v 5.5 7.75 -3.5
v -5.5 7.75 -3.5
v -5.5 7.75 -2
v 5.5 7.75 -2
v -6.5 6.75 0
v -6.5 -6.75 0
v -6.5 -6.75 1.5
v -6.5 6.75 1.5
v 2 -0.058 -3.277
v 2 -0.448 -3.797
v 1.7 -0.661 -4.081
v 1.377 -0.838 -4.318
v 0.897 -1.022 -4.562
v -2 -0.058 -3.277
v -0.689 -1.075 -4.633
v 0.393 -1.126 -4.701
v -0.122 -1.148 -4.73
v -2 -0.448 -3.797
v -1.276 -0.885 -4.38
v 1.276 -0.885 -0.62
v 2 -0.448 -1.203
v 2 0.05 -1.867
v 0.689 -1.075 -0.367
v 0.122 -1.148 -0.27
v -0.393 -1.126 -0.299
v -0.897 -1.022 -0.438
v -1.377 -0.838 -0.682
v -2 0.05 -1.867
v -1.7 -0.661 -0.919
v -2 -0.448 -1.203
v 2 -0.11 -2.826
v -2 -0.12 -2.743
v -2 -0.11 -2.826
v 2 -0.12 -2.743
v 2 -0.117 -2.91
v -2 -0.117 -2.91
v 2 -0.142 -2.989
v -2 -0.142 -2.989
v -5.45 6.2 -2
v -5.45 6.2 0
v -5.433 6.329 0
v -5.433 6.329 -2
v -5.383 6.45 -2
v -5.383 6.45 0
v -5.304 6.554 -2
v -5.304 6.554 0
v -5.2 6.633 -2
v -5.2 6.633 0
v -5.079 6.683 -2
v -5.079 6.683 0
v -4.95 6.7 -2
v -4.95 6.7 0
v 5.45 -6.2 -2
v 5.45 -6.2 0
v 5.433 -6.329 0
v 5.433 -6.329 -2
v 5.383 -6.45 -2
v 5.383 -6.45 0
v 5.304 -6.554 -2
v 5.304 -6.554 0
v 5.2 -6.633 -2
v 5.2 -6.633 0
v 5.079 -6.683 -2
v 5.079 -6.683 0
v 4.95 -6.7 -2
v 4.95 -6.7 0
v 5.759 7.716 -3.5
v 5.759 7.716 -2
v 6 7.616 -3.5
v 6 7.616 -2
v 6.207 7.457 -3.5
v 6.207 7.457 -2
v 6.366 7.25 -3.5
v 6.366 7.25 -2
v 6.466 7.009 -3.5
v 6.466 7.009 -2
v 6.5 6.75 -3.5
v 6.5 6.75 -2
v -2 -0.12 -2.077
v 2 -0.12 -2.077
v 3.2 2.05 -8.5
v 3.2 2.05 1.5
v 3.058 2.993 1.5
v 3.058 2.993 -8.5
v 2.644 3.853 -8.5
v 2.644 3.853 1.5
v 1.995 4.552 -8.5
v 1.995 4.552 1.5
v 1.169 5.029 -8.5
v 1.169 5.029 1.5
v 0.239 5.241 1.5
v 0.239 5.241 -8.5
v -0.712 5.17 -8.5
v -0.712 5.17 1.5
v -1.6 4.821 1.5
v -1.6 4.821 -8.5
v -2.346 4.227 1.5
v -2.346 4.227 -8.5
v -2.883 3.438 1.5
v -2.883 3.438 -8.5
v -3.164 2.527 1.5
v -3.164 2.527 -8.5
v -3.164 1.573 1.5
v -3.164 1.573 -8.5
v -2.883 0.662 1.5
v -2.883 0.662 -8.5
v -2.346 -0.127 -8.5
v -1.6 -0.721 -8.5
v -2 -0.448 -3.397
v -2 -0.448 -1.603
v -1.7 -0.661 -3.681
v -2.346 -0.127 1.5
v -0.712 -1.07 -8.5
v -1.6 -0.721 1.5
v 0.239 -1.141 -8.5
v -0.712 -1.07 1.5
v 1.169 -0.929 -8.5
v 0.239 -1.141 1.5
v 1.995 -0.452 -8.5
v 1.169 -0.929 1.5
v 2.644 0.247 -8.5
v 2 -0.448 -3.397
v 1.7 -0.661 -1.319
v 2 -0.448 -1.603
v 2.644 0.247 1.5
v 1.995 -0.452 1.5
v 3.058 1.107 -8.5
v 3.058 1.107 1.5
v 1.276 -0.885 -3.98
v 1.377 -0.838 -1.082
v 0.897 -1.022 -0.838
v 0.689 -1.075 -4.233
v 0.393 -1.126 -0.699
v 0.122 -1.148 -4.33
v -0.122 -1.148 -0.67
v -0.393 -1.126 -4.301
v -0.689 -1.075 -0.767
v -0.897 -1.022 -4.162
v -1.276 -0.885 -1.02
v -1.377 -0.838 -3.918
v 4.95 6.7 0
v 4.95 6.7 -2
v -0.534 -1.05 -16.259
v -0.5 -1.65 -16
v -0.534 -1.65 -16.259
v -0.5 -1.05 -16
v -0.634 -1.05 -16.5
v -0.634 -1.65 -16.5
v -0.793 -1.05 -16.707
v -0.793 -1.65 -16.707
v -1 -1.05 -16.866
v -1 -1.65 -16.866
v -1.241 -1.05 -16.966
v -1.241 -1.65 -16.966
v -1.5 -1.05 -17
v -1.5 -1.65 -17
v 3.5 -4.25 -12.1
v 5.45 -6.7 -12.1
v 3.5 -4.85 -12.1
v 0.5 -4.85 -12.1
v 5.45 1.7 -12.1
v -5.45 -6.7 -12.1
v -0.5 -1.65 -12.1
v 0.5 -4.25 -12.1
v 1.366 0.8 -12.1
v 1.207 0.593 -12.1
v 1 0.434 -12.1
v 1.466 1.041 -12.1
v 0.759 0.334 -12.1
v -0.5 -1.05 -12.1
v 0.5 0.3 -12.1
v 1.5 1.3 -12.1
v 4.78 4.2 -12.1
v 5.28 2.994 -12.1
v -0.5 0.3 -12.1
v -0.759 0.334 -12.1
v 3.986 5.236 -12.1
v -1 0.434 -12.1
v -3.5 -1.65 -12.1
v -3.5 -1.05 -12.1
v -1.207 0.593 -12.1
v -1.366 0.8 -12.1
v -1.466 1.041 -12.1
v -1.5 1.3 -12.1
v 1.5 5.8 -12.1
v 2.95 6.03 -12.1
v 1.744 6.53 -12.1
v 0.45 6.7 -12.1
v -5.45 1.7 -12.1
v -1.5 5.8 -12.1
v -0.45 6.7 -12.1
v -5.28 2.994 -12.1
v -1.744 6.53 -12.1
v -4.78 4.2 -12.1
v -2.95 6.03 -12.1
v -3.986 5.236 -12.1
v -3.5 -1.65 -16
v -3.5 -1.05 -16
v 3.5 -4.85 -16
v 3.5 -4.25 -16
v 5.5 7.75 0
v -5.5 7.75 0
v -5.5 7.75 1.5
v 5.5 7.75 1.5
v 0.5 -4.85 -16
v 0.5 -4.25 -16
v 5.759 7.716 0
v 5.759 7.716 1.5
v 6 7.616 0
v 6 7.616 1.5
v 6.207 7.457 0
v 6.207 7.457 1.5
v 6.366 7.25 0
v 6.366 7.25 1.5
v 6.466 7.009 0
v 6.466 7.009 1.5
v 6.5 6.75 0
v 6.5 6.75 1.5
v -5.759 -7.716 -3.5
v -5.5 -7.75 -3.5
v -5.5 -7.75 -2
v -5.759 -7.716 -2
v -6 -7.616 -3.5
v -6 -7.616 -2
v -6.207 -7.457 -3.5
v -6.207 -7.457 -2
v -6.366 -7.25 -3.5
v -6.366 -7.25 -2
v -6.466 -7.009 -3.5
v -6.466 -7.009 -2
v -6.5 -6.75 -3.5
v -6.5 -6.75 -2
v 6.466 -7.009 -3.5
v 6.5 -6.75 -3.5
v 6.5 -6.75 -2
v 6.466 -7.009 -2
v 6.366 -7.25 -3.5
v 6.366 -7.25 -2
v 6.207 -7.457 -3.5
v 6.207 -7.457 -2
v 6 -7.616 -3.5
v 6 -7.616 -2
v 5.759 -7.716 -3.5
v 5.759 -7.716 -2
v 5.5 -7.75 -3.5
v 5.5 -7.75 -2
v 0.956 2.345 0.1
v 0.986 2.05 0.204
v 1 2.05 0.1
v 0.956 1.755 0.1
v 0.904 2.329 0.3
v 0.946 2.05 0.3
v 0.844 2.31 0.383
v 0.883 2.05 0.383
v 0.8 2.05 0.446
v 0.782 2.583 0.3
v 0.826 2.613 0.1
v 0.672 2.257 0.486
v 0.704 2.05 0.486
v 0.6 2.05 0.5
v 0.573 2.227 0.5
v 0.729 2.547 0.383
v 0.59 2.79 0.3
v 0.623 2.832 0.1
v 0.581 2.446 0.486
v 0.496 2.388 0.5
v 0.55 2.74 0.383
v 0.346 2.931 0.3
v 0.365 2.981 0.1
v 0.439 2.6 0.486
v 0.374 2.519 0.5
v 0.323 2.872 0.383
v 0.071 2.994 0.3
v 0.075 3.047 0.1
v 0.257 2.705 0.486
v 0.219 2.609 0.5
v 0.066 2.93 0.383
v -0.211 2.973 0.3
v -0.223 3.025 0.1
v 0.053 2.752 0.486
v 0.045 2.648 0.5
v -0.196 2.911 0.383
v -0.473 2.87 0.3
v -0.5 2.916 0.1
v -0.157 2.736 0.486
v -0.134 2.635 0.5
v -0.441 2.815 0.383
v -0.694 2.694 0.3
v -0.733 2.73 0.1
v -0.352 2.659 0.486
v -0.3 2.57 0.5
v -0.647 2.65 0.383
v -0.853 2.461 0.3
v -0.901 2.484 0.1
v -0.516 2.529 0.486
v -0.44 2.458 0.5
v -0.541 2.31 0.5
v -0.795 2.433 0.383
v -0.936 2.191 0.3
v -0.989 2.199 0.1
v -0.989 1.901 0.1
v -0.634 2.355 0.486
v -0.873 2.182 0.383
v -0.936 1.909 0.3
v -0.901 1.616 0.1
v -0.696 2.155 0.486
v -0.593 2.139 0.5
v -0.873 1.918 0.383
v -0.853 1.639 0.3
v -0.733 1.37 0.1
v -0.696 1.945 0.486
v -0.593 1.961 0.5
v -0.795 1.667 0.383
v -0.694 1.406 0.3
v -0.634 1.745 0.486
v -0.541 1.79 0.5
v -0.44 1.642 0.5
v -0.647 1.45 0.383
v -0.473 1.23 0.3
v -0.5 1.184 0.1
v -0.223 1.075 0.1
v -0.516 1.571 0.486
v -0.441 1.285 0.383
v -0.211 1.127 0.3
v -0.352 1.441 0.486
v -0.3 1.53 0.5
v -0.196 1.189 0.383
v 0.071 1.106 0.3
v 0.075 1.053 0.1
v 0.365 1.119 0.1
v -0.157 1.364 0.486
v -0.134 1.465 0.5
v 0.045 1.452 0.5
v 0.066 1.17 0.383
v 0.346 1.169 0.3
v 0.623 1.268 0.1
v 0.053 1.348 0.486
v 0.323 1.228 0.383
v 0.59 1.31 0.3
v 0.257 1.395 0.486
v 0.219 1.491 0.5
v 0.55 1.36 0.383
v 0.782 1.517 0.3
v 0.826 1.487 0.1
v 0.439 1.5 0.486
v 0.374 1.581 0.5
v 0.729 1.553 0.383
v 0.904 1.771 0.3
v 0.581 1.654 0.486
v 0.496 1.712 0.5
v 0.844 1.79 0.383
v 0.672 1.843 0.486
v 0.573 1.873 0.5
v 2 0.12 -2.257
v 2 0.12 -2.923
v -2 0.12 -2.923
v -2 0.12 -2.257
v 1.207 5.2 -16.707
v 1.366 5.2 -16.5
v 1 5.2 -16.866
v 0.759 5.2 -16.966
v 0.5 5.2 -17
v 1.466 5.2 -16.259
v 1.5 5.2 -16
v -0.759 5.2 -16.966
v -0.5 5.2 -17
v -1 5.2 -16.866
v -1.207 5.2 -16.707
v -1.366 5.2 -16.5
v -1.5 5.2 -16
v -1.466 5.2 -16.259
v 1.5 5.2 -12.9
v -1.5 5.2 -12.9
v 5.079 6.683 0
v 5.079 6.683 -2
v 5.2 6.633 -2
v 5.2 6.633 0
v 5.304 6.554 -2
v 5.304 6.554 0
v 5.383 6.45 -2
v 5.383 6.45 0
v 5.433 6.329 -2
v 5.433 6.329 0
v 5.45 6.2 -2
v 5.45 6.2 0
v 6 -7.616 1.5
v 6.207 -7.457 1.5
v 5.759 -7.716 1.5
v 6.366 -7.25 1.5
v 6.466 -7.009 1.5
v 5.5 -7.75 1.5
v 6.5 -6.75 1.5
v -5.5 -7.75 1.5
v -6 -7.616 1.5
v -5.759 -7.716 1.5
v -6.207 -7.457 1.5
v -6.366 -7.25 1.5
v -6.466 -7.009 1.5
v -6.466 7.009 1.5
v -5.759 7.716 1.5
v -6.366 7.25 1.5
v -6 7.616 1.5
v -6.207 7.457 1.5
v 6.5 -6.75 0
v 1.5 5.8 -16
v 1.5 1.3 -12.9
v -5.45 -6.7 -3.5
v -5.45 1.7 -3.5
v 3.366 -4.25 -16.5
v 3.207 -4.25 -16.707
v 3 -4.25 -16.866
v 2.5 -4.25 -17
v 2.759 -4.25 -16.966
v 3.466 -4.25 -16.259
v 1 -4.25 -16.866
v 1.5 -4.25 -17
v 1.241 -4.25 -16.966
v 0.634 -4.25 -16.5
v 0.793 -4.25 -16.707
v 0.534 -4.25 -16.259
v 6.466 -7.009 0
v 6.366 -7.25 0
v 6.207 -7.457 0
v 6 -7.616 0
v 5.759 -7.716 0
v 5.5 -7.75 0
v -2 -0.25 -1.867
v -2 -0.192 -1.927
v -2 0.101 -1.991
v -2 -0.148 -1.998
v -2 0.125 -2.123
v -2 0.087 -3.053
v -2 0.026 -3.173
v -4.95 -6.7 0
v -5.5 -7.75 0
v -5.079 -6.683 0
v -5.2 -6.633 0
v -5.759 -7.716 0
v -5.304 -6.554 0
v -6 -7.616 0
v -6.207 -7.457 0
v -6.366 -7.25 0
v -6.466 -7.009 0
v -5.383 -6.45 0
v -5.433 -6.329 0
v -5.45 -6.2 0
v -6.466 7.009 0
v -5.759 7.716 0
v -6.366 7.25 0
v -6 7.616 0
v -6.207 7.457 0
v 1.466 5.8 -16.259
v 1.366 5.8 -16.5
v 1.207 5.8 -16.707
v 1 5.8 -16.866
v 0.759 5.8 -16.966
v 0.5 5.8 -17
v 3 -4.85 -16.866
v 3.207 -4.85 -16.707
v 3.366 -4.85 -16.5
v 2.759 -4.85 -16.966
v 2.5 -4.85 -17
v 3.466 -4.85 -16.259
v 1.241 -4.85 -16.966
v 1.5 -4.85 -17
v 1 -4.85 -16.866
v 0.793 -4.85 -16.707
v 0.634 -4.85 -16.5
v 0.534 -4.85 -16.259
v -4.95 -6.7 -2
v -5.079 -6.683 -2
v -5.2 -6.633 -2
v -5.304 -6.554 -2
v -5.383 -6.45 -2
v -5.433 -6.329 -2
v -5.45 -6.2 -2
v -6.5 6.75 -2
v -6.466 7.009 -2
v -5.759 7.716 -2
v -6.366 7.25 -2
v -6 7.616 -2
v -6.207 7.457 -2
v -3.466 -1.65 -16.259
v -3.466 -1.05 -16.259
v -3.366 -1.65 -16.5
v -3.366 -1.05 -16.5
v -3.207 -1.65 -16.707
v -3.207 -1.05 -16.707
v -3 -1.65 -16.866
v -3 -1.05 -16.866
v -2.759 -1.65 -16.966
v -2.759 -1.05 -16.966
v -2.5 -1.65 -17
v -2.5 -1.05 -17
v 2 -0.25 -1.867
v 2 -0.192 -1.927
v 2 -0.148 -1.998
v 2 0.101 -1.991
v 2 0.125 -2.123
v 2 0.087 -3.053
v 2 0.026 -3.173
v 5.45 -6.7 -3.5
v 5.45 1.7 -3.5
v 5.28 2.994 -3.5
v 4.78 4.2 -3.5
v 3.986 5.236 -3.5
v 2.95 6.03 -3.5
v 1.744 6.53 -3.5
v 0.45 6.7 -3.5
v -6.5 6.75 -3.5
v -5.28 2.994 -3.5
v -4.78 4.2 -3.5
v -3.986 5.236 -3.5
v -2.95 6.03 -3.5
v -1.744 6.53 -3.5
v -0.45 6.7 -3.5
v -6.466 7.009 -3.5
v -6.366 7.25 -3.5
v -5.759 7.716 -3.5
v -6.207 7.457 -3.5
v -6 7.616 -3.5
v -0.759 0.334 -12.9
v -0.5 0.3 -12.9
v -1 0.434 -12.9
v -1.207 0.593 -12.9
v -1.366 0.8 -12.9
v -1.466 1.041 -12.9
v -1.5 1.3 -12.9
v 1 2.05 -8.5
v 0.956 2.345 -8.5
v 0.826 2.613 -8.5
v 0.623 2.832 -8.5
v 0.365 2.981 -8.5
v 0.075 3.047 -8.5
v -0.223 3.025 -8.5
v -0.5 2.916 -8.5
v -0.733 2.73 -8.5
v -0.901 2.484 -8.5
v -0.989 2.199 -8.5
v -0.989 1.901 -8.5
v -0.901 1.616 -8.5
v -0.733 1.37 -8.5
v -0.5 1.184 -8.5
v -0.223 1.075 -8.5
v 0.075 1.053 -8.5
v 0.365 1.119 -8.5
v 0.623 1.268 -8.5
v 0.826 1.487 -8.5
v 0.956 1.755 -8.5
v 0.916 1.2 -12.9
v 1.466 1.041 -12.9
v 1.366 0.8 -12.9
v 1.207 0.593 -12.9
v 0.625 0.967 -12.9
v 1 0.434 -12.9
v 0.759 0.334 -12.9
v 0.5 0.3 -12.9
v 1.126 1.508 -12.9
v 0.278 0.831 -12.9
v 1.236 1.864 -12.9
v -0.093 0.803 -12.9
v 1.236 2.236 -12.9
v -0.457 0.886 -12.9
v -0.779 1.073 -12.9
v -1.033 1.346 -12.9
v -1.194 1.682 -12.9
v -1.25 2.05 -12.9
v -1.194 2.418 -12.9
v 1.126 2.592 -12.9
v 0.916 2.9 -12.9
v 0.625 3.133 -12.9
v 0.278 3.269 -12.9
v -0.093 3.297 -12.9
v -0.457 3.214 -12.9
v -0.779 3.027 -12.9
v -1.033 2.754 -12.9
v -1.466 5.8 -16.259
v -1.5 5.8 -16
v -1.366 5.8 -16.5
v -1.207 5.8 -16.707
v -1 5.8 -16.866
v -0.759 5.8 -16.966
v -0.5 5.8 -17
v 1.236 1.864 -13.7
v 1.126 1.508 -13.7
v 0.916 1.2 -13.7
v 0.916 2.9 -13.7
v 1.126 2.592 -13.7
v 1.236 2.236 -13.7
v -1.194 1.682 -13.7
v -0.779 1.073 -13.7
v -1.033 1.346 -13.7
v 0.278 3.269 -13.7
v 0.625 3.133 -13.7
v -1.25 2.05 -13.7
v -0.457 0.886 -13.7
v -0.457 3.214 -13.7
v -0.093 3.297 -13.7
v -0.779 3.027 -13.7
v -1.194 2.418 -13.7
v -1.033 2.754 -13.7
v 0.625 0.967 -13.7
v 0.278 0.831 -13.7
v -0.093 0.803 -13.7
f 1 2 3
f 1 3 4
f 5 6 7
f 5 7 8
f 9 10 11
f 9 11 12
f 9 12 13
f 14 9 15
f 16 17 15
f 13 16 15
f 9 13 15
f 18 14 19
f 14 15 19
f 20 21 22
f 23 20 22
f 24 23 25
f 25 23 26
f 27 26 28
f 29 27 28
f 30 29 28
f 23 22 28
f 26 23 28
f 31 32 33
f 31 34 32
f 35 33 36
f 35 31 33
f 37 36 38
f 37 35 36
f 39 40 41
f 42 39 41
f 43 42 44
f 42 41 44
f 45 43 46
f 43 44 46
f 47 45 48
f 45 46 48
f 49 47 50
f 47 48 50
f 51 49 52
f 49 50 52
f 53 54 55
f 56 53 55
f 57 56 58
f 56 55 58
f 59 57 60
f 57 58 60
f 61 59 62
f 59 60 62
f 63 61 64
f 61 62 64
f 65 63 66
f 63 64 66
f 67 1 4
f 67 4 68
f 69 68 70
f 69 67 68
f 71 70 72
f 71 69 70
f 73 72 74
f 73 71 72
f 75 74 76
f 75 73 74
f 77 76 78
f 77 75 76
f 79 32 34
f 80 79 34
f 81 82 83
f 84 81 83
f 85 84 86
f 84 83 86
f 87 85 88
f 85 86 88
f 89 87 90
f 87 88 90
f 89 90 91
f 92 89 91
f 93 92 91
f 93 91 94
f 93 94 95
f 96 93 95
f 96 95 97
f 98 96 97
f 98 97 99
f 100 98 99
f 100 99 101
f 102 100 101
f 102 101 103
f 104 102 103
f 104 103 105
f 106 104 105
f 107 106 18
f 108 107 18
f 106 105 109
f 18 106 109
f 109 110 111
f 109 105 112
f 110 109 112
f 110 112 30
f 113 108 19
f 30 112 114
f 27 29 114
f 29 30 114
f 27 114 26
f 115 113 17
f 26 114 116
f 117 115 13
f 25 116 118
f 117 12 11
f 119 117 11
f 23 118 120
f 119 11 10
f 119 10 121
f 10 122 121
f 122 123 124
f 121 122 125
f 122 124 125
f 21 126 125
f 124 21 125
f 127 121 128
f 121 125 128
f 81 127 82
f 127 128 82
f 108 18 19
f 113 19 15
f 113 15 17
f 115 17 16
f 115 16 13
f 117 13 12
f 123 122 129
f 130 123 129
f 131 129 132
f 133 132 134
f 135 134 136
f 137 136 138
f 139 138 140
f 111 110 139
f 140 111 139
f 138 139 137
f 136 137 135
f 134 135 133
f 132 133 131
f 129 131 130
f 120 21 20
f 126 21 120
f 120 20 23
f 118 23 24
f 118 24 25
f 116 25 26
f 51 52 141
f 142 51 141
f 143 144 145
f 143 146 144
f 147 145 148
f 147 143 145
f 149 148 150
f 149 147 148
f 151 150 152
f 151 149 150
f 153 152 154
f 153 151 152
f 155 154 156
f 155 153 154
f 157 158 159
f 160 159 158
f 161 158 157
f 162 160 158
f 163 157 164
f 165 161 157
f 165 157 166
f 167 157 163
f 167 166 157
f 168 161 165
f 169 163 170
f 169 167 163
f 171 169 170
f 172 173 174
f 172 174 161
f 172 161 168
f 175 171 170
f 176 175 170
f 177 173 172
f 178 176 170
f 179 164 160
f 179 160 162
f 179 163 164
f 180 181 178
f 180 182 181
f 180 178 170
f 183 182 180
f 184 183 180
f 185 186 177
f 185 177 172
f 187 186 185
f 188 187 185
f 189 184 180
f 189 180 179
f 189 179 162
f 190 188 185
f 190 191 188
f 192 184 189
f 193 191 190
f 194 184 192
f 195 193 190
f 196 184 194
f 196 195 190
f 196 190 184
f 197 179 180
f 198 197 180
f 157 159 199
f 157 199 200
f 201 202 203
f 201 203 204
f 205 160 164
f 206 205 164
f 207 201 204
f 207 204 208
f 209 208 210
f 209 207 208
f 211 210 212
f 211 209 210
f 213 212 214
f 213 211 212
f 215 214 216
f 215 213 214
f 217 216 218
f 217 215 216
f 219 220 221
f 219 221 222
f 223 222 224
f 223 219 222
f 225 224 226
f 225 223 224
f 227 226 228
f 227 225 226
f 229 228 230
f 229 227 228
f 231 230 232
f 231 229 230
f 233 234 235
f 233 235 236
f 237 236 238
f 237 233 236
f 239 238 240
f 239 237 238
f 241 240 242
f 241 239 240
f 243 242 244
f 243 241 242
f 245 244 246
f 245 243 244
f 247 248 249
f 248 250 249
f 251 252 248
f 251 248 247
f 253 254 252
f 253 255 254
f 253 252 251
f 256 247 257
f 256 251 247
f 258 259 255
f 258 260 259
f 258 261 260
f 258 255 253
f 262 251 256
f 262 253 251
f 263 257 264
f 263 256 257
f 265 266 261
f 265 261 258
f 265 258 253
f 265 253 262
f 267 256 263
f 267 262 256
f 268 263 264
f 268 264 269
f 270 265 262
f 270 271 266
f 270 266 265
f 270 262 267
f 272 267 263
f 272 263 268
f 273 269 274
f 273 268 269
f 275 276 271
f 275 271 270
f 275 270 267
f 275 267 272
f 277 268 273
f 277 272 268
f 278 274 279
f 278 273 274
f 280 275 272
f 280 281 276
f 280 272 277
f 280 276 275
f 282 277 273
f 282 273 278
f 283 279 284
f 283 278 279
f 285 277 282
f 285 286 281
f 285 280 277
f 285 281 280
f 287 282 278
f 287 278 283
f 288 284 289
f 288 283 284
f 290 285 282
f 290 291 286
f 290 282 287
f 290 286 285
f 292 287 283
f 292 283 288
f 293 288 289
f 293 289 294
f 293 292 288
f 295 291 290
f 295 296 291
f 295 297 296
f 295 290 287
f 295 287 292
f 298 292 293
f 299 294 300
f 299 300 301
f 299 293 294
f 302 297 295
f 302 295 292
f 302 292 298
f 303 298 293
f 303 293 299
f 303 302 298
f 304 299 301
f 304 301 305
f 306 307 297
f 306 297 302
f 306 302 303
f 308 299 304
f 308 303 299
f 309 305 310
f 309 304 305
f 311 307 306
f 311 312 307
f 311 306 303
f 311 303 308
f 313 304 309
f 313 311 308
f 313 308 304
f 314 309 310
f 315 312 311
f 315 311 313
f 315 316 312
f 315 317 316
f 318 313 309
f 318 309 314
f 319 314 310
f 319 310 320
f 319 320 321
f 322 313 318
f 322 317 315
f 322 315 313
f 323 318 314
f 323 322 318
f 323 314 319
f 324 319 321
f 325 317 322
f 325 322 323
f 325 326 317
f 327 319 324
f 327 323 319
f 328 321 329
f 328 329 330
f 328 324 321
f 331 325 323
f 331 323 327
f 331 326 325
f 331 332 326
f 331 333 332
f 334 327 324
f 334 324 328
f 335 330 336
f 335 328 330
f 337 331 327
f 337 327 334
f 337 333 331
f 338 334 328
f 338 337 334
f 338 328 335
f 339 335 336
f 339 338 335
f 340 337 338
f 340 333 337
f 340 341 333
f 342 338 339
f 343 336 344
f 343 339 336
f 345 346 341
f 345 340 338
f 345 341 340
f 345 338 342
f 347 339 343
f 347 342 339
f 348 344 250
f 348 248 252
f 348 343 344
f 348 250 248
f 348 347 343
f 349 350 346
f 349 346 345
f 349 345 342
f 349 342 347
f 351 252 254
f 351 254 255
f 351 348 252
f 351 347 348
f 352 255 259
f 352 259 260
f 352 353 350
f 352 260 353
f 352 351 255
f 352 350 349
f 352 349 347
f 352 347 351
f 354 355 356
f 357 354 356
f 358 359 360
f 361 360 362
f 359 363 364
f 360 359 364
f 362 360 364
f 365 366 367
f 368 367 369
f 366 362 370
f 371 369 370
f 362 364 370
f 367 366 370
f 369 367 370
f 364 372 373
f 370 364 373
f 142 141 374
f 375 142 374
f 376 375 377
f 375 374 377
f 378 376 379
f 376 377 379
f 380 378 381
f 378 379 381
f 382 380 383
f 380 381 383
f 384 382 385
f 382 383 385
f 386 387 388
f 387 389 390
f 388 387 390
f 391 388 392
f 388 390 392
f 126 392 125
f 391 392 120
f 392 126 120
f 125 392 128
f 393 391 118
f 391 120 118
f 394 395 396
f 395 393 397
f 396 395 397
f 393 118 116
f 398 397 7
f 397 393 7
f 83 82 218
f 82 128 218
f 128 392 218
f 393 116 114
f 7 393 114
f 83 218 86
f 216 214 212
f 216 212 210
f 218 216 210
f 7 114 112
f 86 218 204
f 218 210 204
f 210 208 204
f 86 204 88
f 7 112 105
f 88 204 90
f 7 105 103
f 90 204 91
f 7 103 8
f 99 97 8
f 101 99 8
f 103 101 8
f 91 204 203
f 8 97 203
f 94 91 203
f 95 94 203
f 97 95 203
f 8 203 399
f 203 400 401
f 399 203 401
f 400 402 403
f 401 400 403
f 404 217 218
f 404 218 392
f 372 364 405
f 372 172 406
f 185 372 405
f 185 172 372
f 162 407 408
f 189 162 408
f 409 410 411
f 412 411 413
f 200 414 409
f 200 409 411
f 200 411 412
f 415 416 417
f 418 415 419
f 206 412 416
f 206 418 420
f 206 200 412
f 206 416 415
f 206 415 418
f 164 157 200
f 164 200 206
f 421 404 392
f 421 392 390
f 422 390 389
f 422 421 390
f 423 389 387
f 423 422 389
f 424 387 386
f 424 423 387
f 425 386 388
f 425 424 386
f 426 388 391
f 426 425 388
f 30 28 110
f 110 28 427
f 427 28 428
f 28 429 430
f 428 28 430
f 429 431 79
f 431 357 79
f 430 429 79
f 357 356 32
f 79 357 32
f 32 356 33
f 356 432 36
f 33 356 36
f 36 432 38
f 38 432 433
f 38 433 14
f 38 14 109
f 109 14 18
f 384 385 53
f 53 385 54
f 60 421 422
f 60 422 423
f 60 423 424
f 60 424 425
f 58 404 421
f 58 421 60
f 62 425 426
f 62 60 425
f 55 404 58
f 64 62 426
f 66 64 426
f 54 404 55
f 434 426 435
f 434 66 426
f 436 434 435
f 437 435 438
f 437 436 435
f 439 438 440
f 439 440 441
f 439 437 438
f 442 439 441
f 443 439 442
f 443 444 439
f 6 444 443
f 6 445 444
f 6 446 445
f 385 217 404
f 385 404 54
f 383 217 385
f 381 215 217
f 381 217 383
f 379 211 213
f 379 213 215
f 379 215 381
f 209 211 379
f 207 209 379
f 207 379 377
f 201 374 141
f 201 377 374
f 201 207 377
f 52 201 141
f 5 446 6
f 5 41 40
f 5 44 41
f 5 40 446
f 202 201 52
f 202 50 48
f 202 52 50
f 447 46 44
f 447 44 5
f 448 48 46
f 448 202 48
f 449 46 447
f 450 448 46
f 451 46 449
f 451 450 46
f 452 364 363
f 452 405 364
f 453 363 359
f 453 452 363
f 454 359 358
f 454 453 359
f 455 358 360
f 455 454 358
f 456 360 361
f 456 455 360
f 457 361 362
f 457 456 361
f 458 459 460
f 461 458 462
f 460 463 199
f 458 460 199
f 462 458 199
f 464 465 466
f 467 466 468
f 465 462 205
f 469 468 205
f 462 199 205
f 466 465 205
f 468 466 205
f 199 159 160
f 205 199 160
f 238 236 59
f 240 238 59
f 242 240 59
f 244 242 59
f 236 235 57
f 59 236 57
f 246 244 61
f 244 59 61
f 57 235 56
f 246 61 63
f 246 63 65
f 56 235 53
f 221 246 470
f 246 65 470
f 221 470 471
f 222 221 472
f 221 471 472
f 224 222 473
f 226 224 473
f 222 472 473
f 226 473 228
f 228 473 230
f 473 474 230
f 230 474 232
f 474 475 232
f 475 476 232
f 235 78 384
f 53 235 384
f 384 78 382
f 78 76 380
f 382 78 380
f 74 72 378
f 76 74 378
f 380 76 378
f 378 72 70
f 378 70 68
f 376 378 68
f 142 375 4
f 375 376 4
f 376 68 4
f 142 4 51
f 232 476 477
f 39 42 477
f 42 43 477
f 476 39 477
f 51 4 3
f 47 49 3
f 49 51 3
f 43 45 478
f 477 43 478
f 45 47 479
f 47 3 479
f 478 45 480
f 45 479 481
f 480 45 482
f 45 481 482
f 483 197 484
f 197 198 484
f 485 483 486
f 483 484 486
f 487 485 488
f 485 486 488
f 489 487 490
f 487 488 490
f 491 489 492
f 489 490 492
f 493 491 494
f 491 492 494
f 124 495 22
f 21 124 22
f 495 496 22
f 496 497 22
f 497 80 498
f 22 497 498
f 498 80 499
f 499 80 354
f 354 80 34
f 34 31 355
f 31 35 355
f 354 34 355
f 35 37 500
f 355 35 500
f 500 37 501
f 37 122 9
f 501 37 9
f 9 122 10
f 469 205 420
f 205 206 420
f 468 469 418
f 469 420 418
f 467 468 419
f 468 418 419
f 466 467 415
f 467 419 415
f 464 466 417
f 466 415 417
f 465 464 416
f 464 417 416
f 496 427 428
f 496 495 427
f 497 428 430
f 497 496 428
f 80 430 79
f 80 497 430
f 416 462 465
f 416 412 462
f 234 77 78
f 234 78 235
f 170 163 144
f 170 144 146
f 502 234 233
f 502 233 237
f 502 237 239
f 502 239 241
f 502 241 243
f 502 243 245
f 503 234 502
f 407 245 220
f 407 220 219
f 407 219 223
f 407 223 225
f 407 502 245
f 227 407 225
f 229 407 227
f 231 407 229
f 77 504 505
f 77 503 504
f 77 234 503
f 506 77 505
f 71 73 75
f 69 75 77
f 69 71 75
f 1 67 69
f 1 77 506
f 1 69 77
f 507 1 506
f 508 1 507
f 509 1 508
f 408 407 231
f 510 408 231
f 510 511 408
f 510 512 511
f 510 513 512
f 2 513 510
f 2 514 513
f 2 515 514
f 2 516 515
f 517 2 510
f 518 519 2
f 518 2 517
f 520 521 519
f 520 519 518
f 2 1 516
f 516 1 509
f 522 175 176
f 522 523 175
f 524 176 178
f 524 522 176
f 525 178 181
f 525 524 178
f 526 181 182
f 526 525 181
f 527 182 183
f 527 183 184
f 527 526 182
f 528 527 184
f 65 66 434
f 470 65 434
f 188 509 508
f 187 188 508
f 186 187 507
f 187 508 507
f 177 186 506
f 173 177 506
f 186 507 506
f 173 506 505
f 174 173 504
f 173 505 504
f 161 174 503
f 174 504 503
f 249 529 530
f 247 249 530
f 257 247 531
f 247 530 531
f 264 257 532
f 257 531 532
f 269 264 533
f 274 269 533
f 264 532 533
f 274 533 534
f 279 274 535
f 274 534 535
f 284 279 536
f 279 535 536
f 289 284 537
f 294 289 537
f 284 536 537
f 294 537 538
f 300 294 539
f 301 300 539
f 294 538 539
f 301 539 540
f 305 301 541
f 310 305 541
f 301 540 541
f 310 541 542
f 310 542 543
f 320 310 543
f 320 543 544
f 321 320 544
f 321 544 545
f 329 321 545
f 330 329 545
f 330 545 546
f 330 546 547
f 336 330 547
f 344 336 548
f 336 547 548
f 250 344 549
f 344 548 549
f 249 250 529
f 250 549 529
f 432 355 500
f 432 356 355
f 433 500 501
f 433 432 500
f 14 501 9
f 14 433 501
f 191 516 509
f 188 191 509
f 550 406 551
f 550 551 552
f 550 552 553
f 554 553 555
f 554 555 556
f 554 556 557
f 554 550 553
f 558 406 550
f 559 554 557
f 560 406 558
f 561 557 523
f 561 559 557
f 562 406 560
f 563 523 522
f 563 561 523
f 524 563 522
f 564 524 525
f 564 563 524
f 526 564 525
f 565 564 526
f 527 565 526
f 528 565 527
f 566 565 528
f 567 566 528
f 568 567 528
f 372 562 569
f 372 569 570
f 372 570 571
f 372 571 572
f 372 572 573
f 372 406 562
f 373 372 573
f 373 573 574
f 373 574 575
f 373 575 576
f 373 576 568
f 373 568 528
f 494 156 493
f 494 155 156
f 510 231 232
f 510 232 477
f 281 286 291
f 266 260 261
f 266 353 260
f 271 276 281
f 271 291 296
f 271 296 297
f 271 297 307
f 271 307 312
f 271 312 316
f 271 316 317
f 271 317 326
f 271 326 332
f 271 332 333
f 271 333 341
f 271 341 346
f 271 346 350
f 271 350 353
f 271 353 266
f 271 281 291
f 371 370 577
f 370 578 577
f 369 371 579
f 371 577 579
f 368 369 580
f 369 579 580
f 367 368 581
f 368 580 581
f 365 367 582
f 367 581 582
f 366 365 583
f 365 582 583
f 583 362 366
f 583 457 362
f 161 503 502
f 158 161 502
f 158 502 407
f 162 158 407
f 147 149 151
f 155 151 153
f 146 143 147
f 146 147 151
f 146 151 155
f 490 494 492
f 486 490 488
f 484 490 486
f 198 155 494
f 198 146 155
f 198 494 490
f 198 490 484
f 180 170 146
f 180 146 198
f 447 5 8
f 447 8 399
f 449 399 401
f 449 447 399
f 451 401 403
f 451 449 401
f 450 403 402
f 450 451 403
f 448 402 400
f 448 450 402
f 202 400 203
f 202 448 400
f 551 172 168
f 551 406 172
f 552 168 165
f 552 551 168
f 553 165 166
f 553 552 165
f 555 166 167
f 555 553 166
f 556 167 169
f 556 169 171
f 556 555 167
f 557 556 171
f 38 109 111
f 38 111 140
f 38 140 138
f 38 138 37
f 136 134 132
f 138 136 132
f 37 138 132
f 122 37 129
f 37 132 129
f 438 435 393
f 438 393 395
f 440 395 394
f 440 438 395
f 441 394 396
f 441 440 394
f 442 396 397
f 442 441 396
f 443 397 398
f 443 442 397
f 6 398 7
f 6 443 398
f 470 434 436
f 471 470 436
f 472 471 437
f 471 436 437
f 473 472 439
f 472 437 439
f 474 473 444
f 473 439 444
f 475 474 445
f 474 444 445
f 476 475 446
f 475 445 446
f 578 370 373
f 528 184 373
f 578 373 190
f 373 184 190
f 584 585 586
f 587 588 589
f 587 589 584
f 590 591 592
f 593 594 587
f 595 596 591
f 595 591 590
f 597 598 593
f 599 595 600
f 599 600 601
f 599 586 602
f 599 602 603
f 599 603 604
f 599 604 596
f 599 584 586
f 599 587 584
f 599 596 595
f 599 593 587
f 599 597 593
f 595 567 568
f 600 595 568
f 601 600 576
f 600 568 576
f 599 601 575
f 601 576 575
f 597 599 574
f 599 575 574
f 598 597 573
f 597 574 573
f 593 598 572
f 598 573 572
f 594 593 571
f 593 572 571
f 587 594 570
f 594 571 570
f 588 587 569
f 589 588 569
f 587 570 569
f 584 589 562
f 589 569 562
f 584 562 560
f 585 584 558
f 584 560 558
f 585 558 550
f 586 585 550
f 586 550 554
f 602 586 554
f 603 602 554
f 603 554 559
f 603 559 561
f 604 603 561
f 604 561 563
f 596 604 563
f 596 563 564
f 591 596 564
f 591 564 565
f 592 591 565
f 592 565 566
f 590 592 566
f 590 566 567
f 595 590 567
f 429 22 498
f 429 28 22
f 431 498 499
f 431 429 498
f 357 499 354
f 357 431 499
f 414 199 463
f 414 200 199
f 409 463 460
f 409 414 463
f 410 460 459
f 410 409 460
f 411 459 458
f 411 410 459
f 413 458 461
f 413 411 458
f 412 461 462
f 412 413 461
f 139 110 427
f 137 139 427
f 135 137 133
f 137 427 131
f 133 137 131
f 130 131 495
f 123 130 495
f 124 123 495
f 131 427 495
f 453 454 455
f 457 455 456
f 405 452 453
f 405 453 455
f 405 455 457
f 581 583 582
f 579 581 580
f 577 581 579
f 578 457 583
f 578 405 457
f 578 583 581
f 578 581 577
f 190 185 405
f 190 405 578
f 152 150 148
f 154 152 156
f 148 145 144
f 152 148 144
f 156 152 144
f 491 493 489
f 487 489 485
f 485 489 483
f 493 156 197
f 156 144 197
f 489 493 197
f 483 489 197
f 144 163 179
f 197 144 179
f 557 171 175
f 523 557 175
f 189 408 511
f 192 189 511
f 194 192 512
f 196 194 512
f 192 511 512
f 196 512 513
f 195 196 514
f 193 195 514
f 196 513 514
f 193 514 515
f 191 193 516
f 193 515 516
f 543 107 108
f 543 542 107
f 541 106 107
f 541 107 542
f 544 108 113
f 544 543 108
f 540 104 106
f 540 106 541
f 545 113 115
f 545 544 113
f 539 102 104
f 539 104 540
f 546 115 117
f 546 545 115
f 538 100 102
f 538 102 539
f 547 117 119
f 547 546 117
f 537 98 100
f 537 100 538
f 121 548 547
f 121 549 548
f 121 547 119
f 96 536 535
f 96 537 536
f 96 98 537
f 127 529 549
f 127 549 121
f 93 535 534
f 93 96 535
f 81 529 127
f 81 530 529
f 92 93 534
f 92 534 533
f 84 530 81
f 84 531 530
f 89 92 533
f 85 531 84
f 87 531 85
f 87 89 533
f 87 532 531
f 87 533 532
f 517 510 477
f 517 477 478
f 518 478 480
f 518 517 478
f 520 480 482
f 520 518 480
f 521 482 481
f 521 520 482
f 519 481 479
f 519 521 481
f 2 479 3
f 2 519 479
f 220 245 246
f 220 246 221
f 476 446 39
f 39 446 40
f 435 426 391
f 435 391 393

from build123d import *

# Parameters (mm, degrees)
EXTRUDE_1_DEPTH     = 1.5
EXTRUDE_2_DEPTH     = 2
EXTRUDE_START       = 1.5
EXTRUDE_3_DEPTH     = 1.5
EXTRUDE_4_DEPTH     = 8.6
SKETCH_5_R          = 3.2
CUT_EXTRUDE_1_DEPTH = 10
SKETCH_6_R          = 1
EXTRUDE_5_DEPTH     = 9
FILLET_1_R          = 0.4
SKETCH_8_W          = 4
SKETCH_8_H          = 0.3
SKETCH_11_W         = 3
SKETCH_11_H         = 0.6
EXTRUDE_6_DEPTH     = 4.9
SKETCH_12_W         = 3
SKETCH_12_H         = 5.5
EXTRUDE_7_DEPTH     = 0.8
SKETCH_13_R         = 1.25
EXTRUDE_8_DEPTH     = 1.6
FILLET_2_R          = 1
FILLET_3_R          = 1


with BuildPart() as part:
    # Эскиз1 → Бобышка-Вытянуть1 (new body)
    with BuildSketch(Plane.XY):
        with BuildLine():
            Line((5.5, -7.75), (-5.5, -7.75))
            ThreePointArc((-5.5, -7.75), (-6.207106781, -7.457106781), (-6.5, -6.75))
            Line((-6.5, -6.75), (-6.5, 6.75))
            ThreePointArc((-6.5, 6.75), (-6.207106781, 7.457106781), (-5.5, 7.75))
            Line((-5.5, 7.75), (5.5, 7.75))
            ThreePointArc((5.5, 7.75), (6.207106781, 7.457106781), (6.5, 6.75))
            Line((6.5, 6.75), (6.5, -6.75))
            ThreePointArc((6.5, -6.75), (6.207106781, -7.457106781), (5.5, -7.75))
        make_face()
    extrude(amount=EXTRUDE_1_DEPTH)

    # Эскиз2 → Бобышка-Вытянуть2 (add)
    with BuildSketch(Plane.XY):
        with BuildLine():
            Line((4.95, -6.7), (-4.95, -6.7))
            ThreePointArc((-4.95, -6.7), (-5.303553391, -6.553553391), (-5.45, -6.2))
            Line((-5.45, -6.2), (-5.45, 6.2))
            ThreePointArc((-5.45, 6.2), (-5.303553391, 6.553553391), (-4.95, 6.7))
            Line((-4.95, 6.7), (4.95, 6.7))
            ThreePointArc((4.95, 6.7), (5.303553391, 6.553553391), (5.45, 6.2))
            Line((5.45, 6.2), (5.45, -6.2))
            ThreePointArc((5.45, -6.2), (5.303553391, -6.553553391), (4.95, -6.7))
        make_face()
    extrude(amount=-EXTRUDE_2_DEPTH)

    # Эскиз3 → Бобышка-Вытянуть3 (add)
    with BuildSketch(Plane(origin=(0, 0, -2), x_dir=(-1, 0, 0), z_dir=(0, 0, -1)).offset(EXTRUDE_START)):
        with BuildLine():
            Line((-5.5, -7.75), (5.5, -7.75))
            ThreePointArc((5.5, -7.75), (6.207106781, -7.457106781), (6.5, -6.75))
            Line((6.5, -6.75), (6.5, 6.75))
            ThreePointArc((6.5, 6.75), (6.207106781, 7.457106781), (5.5, 7.75))
            Line((5.5, 7.75), (-5.5, 7.75))
            ThreePointArc((-5.5, 7.75), (-6.207106781, 7.457106781), (-6.5, 6.75))
            Line((-6.5, 6.75), (-6.5, -6.75))
            ThreePointArc((-6.5, -6.75), (-6.207106781, -7.457106781), (-5.5, -7.75))
        make_face()
    extrude(amount=-EXTRUDE_3_DEPTH)

    # Эскиз4 → Бобышка-Вытянуть4 (add)
    with BuildSketch(Plane(origin=(0, 0, -3.5), x_dir=(-1, 0, 0), z_dir=(0, 0, -1))):
        with BuildLine():
            Line((-5.45, -6.7), (5.45, -6.7))
            Line((5.45, -6.7), (5.45, 1.7))
            ThreePointArc((5.45, 1.7), (3.985533906, 5.235533906), (0.45, 6.7))
            Line((0.45, 6.7), (-0.45, 6.7))
            ThreePointArc((-0.45, 6.7), (-3.985533906, 5.235533906), (-5.45, 1.7))
            Line((-5.45, 1.7), (-5.45, -6.7))
        make_face()
    extrude(amount=EXTRUDE_4_DEPTH)

    # Эскиз5 → Вырез-Вытянуть1 (cut)
    with BuildSketch(Plane.XY.offset(1.5)):
        with Locations((0, 2.05)):
            Circle(SKETCH_5_R)
    extrude(amount=-CUT_EXTRUDE_1_DEPTH, mode=Mode.SUBTRACT)

    # Эскиз6 → Бобышка-Вытянуть5 (add)
    with BuildSketch(Plane.XY.offset(-8.5)):
        with Locations((0, 2.05)):
            Circle(SKETCH_6_R)
    extrude(amount=EXTRUDE_5_DEPTH)

    # Скругление1
    fillet_1_edges = [part.edges().sort_by_distance(p)[0] for p in [
        (-1, 2.05, 0.5),
    ]]
    fillet(fillet_1_edges, radius=FILLET_1_R)

    # По траектории1: sweep along a path in Эскиз9
    with BuildLine(Plane(origin=(0, 0, 0), x_dir=(0, 0, -1), z_dir=(1, 0, 0))) as sweep_1_path:
        Line((0, -1.5), (1.866666667, -0.1))
        ThreePointArc((1.866666667, -0.1), (2.008552784, -0.025658351), (2.166666667, 0))
        Line((2.166666667, 0), (2.833333333, 0))
        ThreePointArc((2.833333333, 0), (2.991447216, -0.025658351), (3.133333333, -0.1))
        Line((3.133333333, -0.1), (4.866666667, -1.4))
        ThreePointArc((4.866666667, -1.4), (5.008552784, -1.474341649), (5.166666667, -1.5))
        Line((5.166666667, -1.5), (8.166666667, -1.5))
    # Эскиз8 → По траектории1 (sweep)
    with BuildSketch(Plane.XY):
        with Locations((0, -1.5)):
            Rectangle(SKETCH_8_W, SKETCH_8_H)
    sweep(path=sweep_1_path.line)

    # Эскиз11 → Бобышка-Вытянуть6 (add)
    with BuildSketch(Plane(origin=(0, 0, -12.1), x_dir=(-1, 0, 0), z_dir=(0, 0, -1))):
        with Locations((-2, -4.55)):
            Rectangle(SKETCH_11_W, SKETCH_11_H)
        with Locations((2, -1.35)):
            Rectangle(SKETCH_11_W, SKETCH_11_H)
        with Locations((0, 5.5)):
            Rectangle(SKETCH_11_W, SKETCH_11_H)
    extrude(amount=EXTRUDE_6_DEPTH)

    # Эскиз12 → Бобышка-Вытянуть7 (add)
    with BuildSketch(Plane(origin=(0, 0, -12.1), x_dir=(-1, 0, 0), z_dir=(0, 0, -1))):
        with Locations((0, 3.05)):
            Rectangle(SKETCH_12_W, SKETCH_12_H)
    extrude(amount=EXTRUDE_7_DEPTH)

    # Эскиз13 → Бобышка-Вытянуть8 (add)
    with BuildSketch(Plane(origin=(0, 0, -12.1), x_dir=(-1, 0, 0), z_dir=(0, 0, -1))):
        with Locations((0, 2.05)):
            Circle(SKETCH_13_R)
    extrude(amount=EXTRUDE_8_DEPTH)

    # Скругление2
    fillet_2_edges = [part.edges().sort_by_distance(p)[0] for p in [
        (-1.5, 0.3, -12.5),
        (1.5, 0.3, -12.5),
    ]]
    fillet(fillet_2_edges, radius=FILLET_2_R)

    # Скругление3
    fillet_3_edges = [part.edges().sort_by_distance(p)[0] for p in [
        (-1.5, 5.5, -17),
        (1.5, 5.5, -17),
        (-3.5, -1.35, -17),
        (-0.5, -1.35, -17),
        (0.5, -4.55, -17),
        (3.5, -4.55, -17),
    ]]
    fillet(fillet_3_edges, radius=FILLET_3_R)


solid = part.part
